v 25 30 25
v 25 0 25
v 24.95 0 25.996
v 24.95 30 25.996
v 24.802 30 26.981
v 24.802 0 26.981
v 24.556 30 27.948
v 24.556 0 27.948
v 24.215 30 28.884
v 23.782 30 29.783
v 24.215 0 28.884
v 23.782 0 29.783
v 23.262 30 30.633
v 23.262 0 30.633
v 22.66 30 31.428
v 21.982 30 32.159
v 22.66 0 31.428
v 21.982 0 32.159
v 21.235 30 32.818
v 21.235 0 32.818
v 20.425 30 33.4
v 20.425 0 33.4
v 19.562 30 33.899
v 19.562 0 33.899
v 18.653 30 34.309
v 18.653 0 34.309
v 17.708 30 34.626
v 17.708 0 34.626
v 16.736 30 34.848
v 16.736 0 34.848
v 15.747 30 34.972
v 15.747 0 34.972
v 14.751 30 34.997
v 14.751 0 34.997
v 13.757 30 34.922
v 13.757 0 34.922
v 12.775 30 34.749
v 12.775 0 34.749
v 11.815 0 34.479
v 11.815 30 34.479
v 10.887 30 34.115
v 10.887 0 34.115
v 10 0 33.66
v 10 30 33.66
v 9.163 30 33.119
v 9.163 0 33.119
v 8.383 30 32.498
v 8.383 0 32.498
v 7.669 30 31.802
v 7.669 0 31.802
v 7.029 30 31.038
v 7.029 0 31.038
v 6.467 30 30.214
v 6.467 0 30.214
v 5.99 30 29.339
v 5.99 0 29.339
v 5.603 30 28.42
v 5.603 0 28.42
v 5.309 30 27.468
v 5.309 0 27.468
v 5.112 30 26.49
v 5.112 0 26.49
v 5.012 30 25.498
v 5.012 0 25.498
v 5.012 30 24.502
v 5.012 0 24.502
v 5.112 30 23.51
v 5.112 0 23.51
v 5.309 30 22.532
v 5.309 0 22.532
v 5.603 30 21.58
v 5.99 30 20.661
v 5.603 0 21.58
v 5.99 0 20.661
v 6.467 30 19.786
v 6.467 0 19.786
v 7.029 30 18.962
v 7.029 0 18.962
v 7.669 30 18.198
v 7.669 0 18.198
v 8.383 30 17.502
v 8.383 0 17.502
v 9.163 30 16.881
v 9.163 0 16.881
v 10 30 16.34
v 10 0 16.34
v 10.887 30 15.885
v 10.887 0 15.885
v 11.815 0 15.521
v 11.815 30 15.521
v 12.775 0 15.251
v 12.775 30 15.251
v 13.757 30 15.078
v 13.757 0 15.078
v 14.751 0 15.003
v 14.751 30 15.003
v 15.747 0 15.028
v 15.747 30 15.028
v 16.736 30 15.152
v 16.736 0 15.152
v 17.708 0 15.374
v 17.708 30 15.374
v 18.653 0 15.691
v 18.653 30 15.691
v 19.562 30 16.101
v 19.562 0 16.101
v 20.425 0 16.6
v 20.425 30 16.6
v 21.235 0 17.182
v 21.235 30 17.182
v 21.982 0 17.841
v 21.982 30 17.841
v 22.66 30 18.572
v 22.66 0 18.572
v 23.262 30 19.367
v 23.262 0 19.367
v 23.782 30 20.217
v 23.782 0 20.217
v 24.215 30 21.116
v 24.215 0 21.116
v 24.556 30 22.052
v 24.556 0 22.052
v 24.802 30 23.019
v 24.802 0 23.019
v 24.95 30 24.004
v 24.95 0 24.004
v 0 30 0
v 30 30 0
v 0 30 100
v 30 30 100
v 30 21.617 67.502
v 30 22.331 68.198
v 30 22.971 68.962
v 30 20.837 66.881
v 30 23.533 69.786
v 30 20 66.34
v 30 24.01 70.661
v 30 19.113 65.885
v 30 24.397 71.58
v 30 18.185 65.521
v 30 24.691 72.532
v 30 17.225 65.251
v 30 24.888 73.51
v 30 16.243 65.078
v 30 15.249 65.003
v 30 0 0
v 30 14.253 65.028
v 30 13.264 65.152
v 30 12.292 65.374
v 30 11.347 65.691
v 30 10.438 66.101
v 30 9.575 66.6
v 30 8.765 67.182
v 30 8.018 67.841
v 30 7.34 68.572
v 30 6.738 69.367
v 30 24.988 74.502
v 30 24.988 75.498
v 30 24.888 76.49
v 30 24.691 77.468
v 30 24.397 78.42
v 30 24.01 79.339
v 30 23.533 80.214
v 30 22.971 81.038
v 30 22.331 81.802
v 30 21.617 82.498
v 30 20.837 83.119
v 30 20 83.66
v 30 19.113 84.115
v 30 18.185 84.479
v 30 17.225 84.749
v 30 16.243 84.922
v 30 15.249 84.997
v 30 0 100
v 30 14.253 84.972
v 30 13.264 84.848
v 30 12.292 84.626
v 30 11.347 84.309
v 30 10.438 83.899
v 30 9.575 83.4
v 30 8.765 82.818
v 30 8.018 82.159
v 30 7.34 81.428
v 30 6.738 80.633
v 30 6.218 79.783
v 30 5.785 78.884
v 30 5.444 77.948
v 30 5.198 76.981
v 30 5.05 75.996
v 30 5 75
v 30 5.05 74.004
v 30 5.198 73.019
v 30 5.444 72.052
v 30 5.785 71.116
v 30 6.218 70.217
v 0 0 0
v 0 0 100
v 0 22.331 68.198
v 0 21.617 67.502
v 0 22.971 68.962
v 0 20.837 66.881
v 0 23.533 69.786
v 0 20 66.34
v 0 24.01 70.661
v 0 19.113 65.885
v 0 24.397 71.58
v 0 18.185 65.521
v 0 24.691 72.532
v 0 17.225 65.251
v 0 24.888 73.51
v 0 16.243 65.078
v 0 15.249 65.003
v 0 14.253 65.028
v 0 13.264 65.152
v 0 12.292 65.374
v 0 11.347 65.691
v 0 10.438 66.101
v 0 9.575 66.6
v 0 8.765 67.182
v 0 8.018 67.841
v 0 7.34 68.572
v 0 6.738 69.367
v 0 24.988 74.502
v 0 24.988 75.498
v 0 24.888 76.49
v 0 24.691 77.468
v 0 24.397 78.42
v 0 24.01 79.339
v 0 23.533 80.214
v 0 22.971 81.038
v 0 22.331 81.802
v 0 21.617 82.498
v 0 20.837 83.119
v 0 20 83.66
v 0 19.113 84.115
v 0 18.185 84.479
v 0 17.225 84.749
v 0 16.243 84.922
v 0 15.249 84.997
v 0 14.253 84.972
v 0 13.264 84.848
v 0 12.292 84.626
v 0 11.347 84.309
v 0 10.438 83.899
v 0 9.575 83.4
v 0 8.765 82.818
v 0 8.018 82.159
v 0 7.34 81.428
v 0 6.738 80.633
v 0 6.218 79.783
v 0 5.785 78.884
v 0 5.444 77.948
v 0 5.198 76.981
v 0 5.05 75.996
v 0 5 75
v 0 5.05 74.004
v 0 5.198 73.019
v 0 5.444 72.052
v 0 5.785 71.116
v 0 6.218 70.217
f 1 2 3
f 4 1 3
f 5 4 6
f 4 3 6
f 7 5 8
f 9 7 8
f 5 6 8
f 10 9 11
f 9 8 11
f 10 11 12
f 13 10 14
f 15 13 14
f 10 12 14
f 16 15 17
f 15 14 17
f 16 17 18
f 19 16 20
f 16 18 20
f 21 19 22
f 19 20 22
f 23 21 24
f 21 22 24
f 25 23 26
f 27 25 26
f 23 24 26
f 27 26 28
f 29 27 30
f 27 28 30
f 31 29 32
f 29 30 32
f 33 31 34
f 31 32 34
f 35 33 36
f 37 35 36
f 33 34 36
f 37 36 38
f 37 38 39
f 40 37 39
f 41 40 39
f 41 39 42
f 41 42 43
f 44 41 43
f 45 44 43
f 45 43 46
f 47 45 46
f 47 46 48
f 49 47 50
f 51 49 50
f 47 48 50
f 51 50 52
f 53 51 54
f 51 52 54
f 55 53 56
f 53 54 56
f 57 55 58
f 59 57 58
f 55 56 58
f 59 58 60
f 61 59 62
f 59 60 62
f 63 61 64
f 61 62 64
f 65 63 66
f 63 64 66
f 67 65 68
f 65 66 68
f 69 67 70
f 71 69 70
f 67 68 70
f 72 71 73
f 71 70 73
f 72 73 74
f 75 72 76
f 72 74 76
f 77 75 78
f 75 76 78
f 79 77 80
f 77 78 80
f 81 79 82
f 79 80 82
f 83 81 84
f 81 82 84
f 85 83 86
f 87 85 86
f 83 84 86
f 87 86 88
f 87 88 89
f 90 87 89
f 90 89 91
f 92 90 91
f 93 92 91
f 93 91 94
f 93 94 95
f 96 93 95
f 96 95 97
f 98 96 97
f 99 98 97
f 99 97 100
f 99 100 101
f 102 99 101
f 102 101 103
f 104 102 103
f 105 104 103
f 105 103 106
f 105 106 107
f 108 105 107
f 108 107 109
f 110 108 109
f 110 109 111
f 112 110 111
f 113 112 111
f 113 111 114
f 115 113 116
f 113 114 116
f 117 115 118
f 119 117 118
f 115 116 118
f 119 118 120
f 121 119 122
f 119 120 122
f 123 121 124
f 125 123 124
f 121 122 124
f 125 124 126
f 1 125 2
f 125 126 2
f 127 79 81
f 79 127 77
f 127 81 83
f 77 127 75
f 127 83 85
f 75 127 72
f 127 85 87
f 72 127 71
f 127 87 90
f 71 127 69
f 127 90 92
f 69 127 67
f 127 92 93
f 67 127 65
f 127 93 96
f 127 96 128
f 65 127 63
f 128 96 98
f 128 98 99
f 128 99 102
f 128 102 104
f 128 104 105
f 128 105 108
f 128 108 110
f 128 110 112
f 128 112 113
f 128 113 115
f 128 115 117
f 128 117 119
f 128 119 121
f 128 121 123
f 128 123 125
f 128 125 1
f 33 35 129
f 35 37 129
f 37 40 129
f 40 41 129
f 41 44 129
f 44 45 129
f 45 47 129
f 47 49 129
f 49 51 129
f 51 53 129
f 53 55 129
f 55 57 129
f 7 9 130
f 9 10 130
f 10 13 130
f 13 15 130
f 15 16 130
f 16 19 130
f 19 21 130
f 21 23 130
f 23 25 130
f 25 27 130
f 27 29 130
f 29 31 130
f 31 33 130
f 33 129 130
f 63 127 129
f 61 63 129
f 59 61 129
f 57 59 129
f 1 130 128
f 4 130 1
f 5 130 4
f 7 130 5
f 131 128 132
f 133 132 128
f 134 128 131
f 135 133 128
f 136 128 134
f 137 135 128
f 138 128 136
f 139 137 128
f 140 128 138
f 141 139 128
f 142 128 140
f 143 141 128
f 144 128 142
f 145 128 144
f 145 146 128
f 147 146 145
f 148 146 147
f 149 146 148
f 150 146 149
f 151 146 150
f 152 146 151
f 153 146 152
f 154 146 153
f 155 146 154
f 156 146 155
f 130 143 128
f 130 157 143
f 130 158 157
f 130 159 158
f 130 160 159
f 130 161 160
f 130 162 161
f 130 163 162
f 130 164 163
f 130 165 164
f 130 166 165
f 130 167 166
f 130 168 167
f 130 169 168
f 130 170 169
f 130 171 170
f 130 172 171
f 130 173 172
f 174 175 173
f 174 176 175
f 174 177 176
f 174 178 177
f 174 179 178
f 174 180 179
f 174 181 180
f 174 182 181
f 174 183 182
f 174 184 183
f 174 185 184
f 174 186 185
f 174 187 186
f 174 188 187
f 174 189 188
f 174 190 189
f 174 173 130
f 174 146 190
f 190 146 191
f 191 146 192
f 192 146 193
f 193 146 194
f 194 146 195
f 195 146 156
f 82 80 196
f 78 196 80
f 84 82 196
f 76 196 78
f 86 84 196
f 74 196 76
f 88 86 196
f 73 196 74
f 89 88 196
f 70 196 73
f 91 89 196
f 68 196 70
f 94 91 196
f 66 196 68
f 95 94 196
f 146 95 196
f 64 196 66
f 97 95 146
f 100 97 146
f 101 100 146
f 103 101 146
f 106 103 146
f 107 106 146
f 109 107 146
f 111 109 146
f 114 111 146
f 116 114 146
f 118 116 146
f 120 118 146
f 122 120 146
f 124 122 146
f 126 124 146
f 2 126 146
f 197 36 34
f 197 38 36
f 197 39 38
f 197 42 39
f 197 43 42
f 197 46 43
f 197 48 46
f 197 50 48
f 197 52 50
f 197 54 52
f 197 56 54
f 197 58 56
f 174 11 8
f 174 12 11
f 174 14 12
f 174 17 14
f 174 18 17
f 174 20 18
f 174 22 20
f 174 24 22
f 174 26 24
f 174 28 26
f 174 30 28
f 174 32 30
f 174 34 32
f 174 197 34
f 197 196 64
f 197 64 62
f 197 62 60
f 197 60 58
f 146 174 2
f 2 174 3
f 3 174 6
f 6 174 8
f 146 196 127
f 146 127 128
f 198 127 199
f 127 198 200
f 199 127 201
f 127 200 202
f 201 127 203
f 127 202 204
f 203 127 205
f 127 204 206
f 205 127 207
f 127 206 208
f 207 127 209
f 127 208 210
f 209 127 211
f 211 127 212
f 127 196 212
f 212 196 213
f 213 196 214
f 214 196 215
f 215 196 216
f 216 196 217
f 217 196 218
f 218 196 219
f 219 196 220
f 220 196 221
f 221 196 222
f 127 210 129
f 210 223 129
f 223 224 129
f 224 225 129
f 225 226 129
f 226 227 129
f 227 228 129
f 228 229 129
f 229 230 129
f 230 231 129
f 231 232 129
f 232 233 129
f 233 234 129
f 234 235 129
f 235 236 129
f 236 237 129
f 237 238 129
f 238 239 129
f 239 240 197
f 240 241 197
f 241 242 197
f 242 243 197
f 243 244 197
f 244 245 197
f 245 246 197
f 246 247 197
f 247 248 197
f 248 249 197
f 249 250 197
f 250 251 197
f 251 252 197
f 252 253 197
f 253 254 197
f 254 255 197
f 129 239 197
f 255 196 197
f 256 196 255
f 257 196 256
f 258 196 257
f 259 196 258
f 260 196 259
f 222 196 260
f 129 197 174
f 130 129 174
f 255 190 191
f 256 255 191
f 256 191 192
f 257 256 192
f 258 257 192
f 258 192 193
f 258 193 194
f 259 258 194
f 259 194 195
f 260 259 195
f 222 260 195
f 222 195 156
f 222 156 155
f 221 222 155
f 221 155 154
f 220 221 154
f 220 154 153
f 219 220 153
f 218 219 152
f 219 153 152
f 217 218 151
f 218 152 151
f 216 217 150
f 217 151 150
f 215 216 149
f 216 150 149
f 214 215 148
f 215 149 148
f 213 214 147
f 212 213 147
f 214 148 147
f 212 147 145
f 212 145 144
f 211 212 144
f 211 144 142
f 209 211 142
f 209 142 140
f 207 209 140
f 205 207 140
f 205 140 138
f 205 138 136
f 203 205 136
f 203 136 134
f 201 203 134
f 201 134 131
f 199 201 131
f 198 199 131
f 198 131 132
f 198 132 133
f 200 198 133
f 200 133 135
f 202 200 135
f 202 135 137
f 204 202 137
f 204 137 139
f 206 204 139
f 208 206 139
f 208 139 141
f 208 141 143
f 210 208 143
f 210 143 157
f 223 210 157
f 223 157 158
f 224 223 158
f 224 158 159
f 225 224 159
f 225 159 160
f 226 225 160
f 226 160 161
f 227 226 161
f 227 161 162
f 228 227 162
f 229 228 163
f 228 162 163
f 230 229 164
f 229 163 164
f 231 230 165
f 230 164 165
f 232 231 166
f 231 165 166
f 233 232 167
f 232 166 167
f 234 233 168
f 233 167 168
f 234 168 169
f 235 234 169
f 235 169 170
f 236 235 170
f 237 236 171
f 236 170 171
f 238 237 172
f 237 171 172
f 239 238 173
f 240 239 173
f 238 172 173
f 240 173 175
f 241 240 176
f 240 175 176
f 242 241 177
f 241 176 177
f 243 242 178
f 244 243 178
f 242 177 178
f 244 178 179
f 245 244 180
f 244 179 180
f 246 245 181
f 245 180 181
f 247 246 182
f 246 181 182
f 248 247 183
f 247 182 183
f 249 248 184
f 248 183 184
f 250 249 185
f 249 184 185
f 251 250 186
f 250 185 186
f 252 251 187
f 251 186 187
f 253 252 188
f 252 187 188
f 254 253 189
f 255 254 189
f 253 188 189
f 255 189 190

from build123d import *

# Parameters (mm, degrees)
F0_W     = 30
F0_H     = 100
F0_R     = 10
F2_DEPTH = 30
F3_D     = 20


with BuildPart() as f2:
    # F0 (on Front) → F2 (new body)
    with BuildSketch(Plane.XZ):
        with Locations((15, 50)):
            Rectangle(F0_W, F0_H)
        with Locations((15, 25)):
            Circle(F0_R, mode=Mode.SUBTRACT)
    extrude(amount=-F2_DEPTH)

    # F3 (through all)
    with Locations(Plane(origin=(0, 0, 0), x_dir=(0, 1, 0), z_dir=(-1, 0, 0))):
        with Locations((15, -75)):
            Hole(F3_D / 2)


solid = f2.part
